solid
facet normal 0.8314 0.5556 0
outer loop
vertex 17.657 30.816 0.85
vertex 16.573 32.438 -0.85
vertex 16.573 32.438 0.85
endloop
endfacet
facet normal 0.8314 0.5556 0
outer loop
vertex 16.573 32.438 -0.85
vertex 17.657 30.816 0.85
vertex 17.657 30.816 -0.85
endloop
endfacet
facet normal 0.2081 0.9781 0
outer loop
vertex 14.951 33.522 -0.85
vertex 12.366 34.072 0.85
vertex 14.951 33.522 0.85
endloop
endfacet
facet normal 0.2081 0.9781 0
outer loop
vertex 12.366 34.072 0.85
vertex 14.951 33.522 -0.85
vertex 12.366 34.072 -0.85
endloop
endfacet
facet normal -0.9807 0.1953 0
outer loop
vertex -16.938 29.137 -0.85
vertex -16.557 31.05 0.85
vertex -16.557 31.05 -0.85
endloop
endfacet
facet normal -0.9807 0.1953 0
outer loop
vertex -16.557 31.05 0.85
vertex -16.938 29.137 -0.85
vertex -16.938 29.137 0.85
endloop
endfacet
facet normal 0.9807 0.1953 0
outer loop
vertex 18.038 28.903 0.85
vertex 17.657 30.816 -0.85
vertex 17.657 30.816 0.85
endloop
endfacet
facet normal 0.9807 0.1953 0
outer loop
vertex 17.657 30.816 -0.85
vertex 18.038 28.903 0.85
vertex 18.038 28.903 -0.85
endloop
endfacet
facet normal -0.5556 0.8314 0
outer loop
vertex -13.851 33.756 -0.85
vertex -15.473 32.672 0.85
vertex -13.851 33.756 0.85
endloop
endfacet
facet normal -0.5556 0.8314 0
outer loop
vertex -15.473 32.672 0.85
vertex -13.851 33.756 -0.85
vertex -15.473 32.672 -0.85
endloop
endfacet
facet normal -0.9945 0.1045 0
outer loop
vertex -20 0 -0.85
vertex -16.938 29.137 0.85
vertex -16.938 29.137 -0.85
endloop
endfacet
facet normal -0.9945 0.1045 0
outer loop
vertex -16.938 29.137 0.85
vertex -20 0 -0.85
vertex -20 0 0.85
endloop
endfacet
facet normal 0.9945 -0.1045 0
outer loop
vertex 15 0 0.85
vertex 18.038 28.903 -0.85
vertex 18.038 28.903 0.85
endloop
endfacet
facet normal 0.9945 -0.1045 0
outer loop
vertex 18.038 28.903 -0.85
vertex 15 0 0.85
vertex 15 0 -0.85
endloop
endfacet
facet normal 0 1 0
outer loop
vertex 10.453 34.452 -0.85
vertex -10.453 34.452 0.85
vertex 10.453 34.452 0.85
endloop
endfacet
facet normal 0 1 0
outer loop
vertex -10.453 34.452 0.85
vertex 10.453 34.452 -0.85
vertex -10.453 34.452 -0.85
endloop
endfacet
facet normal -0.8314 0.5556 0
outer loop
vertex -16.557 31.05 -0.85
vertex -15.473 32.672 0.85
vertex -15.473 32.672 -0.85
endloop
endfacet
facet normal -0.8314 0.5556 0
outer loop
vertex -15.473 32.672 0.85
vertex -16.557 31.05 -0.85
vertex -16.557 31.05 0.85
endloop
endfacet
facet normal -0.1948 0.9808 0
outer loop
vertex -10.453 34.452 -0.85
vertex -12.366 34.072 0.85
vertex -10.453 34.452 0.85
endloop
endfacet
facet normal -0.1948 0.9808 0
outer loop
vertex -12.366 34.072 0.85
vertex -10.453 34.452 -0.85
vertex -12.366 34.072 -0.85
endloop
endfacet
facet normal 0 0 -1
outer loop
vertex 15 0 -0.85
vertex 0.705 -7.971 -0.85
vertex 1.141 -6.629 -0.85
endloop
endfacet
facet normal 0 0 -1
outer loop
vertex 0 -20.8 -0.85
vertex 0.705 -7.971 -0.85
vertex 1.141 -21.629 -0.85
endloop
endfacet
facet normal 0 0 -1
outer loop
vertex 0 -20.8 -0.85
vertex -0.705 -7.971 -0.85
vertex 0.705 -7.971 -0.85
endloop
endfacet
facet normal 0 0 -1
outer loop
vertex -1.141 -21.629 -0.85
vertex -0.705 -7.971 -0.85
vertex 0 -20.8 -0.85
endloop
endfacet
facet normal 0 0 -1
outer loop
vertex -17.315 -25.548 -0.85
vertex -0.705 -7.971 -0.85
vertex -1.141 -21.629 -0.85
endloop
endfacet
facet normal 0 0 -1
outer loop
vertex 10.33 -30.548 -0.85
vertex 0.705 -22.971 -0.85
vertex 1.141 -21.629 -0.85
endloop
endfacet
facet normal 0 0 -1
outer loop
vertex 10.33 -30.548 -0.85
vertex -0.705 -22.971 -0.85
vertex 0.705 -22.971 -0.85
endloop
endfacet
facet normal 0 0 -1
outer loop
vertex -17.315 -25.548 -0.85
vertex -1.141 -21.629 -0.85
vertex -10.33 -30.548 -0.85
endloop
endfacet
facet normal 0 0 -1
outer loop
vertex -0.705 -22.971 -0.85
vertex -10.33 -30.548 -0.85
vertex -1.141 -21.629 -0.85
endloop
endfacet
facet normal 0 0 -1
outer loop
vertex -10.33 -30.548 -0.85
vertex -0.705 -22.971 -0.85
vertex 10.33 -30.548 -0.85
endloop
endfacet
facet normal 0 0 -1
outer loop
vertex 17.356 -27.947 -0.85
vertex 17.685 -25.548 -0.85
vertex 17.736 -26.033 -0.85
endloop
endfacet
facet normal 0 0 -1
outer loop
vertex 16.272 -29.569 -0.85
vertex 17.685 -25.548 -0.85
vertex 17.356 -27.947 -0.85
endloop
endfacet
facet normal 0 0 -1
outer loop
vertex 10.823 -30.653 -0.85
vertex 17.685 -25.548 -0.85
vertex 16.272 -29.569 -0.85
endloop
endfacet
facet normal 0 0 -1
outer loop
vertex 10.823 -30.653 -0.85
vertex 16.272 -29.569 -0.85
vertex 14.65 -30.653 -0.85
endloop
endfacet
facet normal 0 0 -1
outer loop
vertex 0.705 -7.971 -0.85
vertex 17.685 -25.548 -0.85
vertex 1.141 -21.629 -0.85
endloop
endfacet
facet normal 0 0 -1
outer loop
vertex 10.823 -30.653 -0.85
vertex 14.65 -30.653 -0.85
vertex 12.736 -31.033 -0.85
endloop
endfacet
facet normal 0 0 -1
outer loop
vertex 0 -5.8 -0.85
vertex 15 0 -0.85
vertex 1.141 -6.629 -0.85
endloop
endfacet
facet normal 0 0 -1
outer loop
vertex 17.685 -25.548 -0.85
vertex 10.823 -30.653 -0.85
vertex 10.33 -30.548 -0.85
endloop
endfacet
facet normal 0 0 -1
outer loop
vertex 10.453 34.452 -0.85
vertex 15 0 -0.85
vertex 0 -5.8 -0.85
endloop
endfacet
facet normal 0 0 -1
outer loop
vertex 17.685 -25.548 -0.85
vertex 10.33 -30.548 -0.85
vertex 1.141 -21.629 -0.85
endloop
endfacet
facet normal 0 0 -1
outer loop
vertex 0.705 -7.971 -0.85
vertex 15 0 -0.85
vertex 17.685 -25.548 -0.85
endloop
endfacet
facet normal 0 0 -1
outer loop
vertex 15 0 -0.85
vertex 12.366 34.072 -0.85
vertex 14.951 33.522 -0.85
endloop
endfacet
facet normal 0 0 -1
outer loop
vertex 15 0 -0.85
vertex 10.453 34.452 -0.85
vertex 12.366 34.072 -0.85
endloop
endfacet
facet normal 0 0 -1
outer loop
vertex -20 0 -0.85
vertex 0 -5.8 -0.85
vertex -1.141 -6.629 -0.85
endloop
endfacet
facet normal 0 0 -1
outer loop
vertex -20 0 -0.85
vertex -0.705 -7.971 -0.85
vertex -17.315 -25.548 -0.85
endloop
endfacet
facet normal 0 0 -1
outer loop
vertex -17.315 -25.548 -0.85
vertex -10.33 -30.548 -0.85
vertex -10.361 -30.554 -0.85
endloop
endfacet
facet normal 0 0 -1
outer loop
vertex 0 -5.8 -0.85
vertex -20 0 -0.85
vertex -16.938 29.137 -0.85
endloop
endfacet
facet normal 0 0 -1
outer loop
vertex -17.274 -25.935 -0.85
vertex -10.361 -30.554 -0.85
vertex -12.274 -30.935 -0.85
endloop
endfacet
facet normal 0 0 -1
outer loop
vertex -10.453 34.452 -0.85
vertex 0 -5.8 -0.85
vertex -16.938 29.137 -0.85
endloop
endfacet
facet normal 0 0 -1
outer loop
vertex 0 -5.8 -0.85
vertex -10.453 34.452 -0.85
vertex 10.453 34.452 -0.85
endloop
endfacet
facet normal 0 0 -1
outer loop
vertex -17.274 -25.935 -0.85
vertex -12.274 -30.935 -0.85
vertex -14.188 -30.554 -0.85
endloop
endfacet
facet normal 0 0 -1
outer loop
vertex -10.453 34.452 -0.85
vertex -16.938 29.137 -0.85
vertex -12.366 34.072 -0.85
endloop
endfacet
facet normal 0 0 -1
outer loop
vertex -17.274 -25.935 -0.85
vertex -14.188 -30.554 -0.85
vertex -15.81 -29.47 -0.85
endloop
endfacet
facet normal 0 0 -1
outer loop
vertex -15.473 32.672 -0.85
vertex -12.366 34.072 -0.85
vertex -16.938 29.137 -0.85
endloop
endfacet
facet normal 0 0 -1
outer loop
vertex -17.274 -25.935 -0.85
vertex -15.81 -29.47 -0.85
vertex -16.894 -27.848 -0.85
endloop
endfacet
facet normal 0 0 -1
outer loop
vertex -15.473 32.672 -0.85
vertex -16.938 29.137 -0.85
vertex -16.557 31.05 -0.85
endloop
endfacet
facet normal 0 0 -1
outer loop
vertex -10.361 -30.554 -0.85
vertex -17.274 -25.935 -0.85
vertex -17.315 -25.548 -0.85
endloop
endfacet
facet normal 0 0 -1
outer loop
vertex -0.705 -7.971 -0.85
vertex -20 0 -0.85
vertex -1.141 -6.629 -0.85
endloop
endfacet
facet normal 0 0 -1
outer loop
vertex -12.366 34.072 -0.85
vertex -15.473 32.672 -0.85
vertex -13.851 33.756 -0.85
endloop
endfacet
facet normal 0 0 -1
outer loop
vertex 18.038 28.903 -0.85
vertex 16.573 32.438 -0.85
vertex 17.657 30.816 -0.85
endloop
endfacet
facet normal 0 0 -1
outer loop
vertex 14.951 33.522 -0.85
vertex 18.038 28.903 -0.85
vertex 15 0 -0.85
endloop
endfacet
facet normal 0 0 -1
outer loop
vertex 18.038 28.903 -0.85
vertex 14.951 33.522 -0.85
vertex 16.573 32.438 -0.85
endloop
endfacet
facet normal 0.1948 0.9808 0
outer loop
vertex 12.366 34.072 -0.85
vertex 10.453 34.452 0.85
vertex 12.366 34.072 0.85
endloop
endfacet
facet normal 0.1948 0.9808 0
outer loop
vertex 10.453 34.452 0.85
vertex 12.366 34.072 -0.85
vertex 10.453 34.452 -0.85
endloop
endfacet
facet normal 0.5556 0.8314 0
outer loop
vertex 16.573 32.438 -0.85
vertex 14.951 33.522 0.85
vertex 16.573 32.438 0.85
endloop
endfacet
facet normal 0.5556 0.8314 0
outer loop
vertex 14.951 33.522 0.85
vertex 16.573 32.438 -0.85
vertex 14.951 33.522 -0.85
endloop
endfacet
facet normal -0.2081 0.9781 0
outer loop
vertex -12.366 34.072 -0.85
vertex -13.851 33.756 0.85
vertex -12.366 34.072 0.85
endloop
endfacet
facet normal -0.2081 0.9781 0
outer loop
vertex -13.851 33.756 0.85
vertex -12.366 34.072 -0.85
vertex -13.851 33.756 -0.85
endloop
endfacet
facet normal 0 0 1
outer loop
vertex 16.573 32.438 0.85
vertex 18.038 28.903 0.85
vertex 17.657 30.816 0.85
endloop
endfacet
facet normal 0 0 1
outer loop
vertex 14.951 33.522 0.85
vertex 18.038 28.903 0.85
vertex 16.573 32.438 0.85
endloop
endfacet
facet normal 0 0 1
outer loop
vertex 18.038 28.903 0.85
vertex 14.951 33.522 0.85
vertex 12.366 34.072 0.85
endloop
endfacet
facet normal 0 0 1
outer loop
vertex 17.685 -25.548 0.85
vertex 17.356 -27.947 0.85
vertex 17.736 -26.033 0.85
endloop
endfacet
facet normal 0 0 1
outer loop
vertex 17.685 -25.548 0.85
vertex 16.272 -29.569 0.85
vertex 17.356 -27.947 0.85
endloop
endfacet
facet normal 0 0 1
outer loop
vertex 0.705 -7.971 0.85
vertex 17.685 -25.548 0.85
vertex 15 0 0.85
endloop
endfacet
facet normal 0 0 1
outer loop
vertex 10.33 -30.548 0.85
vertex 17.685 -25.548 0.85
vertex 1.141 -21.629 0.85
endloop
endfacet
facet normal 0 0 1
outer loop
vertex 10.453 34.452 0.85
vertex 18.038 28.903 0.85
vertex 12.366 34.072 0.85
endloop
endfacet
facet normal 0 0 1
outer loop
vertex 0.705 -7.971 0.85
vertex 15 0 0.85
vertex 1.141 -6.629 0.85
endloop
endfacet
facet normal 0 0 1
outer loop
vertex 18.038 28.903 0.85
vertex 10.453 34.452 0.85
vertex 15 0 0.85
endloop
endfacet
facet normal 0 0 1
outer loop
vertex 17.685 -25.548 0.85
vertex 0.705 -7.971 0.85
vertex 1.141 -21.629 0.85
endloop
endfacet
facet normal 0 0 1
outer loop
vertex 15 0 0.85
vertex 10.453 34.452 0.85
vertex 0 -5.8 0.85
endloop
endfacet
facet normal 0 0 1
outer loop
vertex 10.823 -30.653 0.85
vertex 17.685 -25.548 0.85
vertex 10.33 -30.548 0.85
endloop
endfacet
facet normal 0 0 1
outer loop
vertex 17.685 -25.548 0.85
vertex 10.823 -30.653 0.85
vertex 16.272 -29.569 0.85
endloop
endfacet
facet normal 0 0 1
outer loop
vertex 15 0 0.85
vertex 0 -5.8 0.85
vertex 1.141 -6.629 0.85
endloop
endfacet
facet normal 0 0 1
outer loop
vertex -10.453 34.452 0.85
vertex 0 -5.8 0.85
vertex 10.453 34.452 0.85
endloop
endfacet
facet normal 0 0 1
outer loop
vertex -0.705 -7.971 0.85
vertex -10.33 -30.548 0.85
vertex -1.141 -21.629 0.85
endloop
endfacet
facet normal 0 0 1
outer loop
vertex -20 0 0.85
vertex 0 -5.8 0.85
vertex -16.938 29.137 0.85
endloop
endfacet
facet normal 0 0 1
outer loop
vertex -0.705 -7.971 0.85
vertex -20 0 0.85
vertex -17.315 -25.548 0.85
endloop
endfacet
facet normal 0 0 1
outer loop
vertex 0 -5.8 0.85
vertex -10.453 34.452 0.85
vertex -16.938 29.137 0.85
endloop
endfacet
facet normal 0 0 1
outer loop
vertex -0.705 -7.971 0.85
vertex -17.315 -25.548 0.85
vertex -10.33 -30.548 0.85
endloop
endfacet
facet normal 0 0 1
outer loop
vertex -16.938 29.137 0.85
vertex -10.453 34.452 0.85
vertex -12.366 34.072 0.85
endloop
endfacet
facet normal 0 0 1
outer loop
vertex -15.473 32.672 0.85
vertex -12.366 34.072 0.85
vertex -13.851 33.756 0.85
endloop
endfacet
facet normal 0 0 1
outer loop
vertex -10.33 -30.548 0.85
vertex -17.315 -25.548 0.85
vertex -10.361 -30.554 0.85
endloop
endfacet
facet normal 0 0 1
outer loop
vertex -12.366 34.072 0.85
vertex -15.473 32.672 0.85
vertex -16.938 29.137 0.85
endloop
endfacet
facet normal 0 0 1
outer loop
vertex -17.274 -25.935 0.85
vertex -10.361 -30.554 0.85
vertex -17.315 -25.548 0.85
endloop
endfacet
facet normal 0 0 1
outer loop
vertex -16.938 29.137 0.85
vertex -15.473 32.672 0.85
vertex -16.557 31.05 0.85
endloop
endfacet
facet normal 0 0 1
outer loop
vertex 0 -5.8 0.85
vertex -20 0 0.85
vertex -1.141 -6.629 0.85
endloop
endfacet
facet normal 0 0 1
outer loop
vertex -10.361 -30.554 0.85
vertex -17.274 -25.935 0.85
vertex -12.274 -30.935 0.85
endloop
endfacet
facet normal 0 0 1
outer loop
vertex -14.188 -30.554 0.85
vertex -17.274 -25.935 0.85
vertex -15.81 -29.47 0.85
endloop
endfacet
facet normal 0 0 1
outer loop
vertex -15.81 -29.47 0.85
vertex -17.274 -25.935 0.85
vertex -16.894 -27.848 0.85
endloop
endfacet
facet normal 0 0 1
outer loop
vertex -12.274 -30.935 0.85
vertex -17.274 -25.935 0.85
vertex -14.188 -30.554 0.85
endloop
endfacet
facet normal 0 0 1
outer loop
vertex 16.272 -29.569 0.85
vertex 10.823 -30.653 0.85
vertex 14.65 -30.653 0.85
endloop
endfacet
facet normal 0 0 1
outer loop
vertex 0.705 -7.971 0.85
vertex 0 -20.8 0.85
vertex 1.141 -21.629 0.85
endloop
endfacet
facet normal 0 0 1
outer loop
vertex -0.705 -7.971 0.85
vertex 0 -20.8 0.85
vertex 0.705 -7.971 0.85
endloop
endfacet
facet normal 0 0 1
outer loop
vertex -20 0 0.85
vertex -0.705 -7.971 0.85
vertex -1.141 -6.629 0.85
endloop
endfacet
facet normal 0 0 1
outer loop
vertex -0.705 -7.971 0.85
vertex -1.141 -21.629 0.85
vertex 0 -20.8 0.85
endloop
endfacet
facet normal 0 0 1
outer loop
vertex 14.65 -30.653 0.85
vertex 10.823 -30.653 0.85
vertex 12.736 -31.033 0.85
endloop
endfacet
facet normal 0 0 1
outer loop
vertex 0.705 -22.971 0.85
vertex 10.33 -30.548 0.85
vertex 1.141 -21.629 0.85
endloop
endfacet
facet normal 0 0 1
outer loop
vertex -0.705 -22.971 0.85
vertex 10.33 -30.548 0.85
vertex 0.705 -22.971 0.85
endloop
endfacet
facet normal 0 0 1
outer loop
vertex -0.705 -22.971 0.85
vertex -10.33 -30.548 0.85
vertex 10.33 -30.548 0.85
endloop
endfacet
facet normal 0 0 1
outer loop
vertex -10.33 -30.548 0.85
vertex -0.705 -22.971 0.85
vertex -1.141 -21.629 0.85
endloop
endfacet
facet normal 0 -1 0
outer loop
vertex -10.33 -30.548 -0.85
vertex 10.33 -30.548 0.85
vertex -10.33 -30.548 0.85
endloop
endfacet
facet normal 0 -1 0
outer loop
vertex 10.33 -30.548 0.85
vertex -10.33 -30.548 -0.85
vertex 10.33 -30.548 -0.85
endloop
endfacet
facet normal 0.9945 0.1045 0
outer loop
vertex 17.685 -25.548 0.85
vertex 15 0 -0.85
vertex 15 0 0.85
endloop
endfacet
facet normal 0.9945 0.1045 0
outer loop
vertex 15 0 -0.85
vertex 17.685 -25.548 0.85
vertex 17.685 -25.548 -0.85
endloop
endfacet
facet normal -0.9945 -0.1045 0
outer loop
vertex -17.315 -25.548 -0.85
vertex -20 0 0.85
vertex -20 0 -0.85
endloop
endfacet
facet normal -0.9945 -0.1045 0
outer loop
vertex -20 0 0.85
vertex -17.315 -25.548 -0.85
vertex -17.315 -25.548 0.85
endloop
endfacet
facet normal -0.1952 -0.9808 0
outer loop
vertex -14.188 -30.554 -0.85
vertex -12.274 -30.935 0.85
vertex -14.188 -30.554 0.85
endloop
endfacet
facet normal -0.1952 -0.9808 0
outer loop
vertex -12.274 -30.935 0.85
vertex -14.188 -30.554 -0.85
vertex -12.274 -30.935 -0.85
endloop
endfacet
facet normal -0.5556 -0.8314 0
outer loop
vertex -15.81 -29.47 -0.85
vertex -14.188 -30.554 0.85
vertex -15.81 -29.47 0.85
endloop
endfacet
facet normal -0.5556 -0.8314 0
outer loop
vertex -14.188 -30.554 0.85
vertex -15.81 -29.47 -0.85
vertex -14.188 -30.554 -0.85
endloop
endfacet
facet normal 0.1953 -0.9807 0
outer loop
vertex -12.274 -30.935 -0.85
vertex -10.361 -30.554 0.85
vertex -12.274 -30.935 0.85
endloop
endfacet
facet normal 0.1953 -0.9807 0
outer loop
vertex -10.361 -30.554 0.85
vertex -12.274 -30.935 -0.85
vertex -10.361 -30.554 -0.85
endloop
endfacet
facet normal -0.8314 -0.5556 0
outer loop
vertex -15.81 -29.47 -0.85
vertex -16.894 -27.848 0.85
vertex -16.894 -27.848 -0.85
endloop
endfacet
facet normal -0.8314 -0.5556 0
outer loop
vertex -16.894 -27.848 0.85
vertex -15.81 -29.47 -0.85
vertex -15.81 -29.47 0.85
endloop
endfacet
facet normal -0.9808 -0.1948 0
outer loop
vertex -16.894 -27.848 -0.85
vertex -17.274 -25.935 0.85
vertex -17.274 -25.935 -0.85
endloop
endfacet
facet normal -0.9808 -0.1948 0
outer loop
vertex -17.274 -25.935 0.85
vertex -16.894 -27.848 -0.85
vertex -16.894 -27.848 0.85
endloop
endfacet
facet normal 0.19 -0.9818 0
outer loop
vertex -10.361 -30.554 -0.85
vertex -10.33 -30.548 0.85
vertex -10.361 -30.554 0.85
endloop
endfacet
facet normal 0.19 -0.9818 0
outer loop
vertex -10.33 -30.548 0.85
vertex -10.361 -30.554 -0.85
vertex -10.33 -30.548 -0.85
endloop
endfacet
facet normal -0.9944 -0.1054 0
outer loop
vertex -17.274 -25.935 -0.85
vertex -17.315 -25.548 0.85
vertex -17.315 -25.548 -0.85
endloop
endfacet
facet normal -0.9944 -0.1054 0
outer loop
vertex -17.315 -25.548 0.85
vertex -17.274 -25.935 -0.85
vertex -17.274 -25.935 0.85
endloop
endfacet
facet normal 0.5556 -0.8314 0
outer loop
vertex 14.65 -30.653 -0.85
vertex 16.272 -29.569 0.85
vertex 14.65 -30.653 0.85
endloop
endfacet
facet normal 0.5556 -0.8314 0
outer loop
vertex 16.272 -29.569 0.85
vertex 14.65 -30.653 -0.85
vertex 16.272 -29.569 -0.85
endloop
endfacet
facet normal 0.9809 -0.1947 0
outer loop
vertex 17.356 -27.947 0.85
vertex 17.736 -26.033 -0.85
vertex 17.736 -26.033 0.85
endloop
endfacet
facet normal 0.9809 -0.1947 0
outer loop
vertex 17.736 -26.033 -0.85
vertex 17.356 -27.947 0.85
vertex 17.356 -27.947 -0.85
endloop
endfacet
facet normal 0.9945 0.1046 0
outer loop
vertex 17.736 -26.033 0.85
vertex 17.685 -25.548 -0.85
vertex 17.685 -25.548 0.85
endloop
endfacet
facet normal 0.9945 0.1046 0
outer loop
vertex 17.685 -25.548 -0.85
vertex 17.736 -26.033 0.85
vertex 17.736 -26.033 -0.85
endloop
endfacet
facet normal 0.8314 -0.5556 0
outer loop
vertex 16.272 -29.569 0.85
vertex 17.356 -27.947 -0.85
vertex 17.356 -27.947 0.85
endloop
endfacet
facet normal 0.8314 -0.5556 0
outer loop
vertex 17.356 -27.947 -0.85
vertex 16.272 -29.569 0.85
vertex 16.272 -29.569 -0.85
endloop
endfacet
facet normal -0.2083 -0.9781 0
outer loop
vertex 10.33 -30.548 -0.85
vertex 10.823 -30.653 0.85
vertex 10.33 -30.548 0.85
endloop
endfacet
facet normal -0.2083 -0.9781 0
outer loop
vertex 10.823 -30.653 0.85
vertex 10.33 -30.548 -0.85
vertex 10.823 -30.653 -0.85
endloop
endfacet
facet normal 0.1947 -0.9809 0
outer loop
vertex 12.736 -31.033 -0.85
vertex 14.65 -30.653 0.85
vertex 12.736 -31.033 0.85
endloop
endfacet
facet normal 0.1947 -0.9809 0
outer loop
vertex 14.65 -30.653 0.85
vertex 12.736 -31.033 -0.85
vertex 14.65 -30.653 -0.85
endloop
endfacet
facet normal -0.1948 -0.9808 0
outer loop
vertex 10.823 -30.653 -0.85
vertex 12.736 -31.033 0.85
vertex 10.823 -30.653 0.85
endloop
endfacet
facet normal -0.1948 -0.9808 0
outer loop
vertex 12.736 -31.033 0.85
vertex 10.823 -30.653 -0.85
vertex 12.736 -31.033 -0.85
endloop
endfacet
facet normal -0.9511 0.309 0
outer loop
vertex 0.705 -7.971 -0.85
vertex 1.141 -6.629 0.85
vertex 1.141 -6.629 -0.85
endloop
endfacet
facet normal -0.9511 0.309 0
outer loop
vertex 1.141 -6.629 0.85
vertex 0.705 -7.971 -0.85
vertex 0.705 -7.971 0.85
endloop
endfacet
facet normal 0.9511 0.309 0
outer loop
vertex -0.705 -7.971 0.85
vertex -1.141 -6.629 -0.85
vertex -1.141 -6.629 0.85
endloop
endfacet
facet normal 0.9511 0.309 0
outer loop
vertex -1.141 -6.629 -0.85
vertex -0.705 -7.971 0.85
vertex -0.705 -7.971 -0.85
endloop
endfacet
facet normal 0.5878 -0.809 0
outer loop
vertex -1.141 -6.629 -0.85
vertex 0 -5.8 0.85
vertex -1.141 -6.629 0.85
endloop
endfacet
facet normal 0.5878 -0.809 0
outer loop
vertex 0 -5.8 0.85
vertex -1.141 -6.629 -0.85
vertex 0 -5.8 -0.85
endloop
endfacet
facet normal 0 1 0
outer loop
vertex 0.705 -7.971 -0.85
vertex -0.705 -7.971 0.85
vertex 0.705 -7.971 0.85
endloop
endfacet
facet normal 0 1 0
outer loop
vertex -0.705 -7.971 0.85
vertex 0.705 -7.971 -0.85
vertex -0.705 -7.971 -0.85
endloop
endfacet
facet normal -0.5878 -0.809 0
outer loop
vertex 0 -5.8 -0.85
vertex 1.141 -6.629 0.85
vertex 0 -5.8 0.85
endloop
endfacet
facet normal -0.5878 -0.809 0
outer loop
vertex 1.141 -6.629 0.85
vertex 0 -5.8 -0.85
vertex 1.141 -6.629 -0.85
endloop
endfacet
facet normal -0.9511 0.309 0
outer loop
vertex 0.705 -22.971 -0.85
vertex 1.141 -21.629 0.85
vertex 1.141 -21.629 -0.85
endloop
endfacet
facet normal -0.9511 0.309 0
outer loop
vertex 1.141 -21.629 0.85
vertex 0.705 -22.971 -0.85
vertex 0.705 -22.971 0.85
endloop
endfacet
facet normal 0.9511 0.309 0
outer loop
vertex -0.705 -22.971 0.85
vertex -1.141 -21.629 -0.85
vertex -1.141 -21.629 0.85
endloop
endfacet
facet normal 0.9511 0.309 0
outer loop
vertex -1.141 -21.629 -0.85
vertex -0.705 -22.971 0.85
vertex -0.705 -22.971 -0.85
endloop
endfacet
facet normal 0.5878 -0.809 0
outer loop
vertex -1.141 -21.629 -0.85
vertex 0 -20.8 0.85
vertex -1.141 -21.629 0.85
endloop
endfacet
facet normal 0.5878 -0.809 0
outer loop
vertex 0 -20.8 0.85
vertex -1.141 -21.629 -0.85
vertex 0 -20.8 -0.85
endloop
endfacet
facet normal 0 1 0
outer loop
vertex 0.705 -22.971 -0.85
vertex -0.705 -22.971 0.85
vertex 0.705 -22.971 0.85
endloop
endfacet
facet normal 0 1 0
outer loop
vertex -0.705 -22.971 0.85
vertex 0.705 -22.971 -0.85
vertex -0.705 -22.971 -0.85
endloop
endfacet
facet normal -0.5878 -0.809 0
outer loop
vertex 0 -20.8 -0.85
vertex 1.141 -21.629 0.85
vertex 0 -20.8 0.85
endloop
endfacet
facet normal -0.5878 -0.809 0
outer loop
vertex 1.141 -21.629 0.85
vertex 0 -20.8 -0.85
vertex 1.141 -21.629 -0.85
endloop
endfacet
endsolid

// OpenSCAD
module blade()
{
    difference()
    {
        minkowski()
        {
            difference()
            {

                cube(size = [ 30, 60, 1.5 ], center = true);
                translate(v = [ 210, 0, -3 ]) cylinder(h = 6, r = 200);
                translate(v = [ -25, 0, 0 ]) scale([ 1, 1, 2 ]) difference()
                {
                    cube(size = [ 30, 60, 1.5 ], center = true);
                    translate(v = [ 210, 0, -3 ]) cylinder(h = 6, r = 200);
                }
                translate(v = [ 0, -125, -3 ]) cylinder(h = 6, r = 100);
                translate(v = [ 0, 55, 0 ]) scale([ 1, 1, 2 ]) difference()
                {
                    cube(size = [ 30, 60, 1.5 ], center = true);
                    translate(v = [ 0, -125, -3 ]) cylinder(h = 6, r = 100);
                }
            }
            translate(v = [ 0, 0, -.1 ]) cylinder(h = 0.2, r = 5);
        }

        translate(v = [ 0, -7, 0 ]) rotate([ 0, 0, 90 ]) cylinder(h = 20, r = 1.2, center = true);
        translate(v = [ 0, -22, 0 ]) rotate([ 0, 0, 90 ]) cylinder(h = 20, r = 1.2, center = true);
    }
}

blade();
